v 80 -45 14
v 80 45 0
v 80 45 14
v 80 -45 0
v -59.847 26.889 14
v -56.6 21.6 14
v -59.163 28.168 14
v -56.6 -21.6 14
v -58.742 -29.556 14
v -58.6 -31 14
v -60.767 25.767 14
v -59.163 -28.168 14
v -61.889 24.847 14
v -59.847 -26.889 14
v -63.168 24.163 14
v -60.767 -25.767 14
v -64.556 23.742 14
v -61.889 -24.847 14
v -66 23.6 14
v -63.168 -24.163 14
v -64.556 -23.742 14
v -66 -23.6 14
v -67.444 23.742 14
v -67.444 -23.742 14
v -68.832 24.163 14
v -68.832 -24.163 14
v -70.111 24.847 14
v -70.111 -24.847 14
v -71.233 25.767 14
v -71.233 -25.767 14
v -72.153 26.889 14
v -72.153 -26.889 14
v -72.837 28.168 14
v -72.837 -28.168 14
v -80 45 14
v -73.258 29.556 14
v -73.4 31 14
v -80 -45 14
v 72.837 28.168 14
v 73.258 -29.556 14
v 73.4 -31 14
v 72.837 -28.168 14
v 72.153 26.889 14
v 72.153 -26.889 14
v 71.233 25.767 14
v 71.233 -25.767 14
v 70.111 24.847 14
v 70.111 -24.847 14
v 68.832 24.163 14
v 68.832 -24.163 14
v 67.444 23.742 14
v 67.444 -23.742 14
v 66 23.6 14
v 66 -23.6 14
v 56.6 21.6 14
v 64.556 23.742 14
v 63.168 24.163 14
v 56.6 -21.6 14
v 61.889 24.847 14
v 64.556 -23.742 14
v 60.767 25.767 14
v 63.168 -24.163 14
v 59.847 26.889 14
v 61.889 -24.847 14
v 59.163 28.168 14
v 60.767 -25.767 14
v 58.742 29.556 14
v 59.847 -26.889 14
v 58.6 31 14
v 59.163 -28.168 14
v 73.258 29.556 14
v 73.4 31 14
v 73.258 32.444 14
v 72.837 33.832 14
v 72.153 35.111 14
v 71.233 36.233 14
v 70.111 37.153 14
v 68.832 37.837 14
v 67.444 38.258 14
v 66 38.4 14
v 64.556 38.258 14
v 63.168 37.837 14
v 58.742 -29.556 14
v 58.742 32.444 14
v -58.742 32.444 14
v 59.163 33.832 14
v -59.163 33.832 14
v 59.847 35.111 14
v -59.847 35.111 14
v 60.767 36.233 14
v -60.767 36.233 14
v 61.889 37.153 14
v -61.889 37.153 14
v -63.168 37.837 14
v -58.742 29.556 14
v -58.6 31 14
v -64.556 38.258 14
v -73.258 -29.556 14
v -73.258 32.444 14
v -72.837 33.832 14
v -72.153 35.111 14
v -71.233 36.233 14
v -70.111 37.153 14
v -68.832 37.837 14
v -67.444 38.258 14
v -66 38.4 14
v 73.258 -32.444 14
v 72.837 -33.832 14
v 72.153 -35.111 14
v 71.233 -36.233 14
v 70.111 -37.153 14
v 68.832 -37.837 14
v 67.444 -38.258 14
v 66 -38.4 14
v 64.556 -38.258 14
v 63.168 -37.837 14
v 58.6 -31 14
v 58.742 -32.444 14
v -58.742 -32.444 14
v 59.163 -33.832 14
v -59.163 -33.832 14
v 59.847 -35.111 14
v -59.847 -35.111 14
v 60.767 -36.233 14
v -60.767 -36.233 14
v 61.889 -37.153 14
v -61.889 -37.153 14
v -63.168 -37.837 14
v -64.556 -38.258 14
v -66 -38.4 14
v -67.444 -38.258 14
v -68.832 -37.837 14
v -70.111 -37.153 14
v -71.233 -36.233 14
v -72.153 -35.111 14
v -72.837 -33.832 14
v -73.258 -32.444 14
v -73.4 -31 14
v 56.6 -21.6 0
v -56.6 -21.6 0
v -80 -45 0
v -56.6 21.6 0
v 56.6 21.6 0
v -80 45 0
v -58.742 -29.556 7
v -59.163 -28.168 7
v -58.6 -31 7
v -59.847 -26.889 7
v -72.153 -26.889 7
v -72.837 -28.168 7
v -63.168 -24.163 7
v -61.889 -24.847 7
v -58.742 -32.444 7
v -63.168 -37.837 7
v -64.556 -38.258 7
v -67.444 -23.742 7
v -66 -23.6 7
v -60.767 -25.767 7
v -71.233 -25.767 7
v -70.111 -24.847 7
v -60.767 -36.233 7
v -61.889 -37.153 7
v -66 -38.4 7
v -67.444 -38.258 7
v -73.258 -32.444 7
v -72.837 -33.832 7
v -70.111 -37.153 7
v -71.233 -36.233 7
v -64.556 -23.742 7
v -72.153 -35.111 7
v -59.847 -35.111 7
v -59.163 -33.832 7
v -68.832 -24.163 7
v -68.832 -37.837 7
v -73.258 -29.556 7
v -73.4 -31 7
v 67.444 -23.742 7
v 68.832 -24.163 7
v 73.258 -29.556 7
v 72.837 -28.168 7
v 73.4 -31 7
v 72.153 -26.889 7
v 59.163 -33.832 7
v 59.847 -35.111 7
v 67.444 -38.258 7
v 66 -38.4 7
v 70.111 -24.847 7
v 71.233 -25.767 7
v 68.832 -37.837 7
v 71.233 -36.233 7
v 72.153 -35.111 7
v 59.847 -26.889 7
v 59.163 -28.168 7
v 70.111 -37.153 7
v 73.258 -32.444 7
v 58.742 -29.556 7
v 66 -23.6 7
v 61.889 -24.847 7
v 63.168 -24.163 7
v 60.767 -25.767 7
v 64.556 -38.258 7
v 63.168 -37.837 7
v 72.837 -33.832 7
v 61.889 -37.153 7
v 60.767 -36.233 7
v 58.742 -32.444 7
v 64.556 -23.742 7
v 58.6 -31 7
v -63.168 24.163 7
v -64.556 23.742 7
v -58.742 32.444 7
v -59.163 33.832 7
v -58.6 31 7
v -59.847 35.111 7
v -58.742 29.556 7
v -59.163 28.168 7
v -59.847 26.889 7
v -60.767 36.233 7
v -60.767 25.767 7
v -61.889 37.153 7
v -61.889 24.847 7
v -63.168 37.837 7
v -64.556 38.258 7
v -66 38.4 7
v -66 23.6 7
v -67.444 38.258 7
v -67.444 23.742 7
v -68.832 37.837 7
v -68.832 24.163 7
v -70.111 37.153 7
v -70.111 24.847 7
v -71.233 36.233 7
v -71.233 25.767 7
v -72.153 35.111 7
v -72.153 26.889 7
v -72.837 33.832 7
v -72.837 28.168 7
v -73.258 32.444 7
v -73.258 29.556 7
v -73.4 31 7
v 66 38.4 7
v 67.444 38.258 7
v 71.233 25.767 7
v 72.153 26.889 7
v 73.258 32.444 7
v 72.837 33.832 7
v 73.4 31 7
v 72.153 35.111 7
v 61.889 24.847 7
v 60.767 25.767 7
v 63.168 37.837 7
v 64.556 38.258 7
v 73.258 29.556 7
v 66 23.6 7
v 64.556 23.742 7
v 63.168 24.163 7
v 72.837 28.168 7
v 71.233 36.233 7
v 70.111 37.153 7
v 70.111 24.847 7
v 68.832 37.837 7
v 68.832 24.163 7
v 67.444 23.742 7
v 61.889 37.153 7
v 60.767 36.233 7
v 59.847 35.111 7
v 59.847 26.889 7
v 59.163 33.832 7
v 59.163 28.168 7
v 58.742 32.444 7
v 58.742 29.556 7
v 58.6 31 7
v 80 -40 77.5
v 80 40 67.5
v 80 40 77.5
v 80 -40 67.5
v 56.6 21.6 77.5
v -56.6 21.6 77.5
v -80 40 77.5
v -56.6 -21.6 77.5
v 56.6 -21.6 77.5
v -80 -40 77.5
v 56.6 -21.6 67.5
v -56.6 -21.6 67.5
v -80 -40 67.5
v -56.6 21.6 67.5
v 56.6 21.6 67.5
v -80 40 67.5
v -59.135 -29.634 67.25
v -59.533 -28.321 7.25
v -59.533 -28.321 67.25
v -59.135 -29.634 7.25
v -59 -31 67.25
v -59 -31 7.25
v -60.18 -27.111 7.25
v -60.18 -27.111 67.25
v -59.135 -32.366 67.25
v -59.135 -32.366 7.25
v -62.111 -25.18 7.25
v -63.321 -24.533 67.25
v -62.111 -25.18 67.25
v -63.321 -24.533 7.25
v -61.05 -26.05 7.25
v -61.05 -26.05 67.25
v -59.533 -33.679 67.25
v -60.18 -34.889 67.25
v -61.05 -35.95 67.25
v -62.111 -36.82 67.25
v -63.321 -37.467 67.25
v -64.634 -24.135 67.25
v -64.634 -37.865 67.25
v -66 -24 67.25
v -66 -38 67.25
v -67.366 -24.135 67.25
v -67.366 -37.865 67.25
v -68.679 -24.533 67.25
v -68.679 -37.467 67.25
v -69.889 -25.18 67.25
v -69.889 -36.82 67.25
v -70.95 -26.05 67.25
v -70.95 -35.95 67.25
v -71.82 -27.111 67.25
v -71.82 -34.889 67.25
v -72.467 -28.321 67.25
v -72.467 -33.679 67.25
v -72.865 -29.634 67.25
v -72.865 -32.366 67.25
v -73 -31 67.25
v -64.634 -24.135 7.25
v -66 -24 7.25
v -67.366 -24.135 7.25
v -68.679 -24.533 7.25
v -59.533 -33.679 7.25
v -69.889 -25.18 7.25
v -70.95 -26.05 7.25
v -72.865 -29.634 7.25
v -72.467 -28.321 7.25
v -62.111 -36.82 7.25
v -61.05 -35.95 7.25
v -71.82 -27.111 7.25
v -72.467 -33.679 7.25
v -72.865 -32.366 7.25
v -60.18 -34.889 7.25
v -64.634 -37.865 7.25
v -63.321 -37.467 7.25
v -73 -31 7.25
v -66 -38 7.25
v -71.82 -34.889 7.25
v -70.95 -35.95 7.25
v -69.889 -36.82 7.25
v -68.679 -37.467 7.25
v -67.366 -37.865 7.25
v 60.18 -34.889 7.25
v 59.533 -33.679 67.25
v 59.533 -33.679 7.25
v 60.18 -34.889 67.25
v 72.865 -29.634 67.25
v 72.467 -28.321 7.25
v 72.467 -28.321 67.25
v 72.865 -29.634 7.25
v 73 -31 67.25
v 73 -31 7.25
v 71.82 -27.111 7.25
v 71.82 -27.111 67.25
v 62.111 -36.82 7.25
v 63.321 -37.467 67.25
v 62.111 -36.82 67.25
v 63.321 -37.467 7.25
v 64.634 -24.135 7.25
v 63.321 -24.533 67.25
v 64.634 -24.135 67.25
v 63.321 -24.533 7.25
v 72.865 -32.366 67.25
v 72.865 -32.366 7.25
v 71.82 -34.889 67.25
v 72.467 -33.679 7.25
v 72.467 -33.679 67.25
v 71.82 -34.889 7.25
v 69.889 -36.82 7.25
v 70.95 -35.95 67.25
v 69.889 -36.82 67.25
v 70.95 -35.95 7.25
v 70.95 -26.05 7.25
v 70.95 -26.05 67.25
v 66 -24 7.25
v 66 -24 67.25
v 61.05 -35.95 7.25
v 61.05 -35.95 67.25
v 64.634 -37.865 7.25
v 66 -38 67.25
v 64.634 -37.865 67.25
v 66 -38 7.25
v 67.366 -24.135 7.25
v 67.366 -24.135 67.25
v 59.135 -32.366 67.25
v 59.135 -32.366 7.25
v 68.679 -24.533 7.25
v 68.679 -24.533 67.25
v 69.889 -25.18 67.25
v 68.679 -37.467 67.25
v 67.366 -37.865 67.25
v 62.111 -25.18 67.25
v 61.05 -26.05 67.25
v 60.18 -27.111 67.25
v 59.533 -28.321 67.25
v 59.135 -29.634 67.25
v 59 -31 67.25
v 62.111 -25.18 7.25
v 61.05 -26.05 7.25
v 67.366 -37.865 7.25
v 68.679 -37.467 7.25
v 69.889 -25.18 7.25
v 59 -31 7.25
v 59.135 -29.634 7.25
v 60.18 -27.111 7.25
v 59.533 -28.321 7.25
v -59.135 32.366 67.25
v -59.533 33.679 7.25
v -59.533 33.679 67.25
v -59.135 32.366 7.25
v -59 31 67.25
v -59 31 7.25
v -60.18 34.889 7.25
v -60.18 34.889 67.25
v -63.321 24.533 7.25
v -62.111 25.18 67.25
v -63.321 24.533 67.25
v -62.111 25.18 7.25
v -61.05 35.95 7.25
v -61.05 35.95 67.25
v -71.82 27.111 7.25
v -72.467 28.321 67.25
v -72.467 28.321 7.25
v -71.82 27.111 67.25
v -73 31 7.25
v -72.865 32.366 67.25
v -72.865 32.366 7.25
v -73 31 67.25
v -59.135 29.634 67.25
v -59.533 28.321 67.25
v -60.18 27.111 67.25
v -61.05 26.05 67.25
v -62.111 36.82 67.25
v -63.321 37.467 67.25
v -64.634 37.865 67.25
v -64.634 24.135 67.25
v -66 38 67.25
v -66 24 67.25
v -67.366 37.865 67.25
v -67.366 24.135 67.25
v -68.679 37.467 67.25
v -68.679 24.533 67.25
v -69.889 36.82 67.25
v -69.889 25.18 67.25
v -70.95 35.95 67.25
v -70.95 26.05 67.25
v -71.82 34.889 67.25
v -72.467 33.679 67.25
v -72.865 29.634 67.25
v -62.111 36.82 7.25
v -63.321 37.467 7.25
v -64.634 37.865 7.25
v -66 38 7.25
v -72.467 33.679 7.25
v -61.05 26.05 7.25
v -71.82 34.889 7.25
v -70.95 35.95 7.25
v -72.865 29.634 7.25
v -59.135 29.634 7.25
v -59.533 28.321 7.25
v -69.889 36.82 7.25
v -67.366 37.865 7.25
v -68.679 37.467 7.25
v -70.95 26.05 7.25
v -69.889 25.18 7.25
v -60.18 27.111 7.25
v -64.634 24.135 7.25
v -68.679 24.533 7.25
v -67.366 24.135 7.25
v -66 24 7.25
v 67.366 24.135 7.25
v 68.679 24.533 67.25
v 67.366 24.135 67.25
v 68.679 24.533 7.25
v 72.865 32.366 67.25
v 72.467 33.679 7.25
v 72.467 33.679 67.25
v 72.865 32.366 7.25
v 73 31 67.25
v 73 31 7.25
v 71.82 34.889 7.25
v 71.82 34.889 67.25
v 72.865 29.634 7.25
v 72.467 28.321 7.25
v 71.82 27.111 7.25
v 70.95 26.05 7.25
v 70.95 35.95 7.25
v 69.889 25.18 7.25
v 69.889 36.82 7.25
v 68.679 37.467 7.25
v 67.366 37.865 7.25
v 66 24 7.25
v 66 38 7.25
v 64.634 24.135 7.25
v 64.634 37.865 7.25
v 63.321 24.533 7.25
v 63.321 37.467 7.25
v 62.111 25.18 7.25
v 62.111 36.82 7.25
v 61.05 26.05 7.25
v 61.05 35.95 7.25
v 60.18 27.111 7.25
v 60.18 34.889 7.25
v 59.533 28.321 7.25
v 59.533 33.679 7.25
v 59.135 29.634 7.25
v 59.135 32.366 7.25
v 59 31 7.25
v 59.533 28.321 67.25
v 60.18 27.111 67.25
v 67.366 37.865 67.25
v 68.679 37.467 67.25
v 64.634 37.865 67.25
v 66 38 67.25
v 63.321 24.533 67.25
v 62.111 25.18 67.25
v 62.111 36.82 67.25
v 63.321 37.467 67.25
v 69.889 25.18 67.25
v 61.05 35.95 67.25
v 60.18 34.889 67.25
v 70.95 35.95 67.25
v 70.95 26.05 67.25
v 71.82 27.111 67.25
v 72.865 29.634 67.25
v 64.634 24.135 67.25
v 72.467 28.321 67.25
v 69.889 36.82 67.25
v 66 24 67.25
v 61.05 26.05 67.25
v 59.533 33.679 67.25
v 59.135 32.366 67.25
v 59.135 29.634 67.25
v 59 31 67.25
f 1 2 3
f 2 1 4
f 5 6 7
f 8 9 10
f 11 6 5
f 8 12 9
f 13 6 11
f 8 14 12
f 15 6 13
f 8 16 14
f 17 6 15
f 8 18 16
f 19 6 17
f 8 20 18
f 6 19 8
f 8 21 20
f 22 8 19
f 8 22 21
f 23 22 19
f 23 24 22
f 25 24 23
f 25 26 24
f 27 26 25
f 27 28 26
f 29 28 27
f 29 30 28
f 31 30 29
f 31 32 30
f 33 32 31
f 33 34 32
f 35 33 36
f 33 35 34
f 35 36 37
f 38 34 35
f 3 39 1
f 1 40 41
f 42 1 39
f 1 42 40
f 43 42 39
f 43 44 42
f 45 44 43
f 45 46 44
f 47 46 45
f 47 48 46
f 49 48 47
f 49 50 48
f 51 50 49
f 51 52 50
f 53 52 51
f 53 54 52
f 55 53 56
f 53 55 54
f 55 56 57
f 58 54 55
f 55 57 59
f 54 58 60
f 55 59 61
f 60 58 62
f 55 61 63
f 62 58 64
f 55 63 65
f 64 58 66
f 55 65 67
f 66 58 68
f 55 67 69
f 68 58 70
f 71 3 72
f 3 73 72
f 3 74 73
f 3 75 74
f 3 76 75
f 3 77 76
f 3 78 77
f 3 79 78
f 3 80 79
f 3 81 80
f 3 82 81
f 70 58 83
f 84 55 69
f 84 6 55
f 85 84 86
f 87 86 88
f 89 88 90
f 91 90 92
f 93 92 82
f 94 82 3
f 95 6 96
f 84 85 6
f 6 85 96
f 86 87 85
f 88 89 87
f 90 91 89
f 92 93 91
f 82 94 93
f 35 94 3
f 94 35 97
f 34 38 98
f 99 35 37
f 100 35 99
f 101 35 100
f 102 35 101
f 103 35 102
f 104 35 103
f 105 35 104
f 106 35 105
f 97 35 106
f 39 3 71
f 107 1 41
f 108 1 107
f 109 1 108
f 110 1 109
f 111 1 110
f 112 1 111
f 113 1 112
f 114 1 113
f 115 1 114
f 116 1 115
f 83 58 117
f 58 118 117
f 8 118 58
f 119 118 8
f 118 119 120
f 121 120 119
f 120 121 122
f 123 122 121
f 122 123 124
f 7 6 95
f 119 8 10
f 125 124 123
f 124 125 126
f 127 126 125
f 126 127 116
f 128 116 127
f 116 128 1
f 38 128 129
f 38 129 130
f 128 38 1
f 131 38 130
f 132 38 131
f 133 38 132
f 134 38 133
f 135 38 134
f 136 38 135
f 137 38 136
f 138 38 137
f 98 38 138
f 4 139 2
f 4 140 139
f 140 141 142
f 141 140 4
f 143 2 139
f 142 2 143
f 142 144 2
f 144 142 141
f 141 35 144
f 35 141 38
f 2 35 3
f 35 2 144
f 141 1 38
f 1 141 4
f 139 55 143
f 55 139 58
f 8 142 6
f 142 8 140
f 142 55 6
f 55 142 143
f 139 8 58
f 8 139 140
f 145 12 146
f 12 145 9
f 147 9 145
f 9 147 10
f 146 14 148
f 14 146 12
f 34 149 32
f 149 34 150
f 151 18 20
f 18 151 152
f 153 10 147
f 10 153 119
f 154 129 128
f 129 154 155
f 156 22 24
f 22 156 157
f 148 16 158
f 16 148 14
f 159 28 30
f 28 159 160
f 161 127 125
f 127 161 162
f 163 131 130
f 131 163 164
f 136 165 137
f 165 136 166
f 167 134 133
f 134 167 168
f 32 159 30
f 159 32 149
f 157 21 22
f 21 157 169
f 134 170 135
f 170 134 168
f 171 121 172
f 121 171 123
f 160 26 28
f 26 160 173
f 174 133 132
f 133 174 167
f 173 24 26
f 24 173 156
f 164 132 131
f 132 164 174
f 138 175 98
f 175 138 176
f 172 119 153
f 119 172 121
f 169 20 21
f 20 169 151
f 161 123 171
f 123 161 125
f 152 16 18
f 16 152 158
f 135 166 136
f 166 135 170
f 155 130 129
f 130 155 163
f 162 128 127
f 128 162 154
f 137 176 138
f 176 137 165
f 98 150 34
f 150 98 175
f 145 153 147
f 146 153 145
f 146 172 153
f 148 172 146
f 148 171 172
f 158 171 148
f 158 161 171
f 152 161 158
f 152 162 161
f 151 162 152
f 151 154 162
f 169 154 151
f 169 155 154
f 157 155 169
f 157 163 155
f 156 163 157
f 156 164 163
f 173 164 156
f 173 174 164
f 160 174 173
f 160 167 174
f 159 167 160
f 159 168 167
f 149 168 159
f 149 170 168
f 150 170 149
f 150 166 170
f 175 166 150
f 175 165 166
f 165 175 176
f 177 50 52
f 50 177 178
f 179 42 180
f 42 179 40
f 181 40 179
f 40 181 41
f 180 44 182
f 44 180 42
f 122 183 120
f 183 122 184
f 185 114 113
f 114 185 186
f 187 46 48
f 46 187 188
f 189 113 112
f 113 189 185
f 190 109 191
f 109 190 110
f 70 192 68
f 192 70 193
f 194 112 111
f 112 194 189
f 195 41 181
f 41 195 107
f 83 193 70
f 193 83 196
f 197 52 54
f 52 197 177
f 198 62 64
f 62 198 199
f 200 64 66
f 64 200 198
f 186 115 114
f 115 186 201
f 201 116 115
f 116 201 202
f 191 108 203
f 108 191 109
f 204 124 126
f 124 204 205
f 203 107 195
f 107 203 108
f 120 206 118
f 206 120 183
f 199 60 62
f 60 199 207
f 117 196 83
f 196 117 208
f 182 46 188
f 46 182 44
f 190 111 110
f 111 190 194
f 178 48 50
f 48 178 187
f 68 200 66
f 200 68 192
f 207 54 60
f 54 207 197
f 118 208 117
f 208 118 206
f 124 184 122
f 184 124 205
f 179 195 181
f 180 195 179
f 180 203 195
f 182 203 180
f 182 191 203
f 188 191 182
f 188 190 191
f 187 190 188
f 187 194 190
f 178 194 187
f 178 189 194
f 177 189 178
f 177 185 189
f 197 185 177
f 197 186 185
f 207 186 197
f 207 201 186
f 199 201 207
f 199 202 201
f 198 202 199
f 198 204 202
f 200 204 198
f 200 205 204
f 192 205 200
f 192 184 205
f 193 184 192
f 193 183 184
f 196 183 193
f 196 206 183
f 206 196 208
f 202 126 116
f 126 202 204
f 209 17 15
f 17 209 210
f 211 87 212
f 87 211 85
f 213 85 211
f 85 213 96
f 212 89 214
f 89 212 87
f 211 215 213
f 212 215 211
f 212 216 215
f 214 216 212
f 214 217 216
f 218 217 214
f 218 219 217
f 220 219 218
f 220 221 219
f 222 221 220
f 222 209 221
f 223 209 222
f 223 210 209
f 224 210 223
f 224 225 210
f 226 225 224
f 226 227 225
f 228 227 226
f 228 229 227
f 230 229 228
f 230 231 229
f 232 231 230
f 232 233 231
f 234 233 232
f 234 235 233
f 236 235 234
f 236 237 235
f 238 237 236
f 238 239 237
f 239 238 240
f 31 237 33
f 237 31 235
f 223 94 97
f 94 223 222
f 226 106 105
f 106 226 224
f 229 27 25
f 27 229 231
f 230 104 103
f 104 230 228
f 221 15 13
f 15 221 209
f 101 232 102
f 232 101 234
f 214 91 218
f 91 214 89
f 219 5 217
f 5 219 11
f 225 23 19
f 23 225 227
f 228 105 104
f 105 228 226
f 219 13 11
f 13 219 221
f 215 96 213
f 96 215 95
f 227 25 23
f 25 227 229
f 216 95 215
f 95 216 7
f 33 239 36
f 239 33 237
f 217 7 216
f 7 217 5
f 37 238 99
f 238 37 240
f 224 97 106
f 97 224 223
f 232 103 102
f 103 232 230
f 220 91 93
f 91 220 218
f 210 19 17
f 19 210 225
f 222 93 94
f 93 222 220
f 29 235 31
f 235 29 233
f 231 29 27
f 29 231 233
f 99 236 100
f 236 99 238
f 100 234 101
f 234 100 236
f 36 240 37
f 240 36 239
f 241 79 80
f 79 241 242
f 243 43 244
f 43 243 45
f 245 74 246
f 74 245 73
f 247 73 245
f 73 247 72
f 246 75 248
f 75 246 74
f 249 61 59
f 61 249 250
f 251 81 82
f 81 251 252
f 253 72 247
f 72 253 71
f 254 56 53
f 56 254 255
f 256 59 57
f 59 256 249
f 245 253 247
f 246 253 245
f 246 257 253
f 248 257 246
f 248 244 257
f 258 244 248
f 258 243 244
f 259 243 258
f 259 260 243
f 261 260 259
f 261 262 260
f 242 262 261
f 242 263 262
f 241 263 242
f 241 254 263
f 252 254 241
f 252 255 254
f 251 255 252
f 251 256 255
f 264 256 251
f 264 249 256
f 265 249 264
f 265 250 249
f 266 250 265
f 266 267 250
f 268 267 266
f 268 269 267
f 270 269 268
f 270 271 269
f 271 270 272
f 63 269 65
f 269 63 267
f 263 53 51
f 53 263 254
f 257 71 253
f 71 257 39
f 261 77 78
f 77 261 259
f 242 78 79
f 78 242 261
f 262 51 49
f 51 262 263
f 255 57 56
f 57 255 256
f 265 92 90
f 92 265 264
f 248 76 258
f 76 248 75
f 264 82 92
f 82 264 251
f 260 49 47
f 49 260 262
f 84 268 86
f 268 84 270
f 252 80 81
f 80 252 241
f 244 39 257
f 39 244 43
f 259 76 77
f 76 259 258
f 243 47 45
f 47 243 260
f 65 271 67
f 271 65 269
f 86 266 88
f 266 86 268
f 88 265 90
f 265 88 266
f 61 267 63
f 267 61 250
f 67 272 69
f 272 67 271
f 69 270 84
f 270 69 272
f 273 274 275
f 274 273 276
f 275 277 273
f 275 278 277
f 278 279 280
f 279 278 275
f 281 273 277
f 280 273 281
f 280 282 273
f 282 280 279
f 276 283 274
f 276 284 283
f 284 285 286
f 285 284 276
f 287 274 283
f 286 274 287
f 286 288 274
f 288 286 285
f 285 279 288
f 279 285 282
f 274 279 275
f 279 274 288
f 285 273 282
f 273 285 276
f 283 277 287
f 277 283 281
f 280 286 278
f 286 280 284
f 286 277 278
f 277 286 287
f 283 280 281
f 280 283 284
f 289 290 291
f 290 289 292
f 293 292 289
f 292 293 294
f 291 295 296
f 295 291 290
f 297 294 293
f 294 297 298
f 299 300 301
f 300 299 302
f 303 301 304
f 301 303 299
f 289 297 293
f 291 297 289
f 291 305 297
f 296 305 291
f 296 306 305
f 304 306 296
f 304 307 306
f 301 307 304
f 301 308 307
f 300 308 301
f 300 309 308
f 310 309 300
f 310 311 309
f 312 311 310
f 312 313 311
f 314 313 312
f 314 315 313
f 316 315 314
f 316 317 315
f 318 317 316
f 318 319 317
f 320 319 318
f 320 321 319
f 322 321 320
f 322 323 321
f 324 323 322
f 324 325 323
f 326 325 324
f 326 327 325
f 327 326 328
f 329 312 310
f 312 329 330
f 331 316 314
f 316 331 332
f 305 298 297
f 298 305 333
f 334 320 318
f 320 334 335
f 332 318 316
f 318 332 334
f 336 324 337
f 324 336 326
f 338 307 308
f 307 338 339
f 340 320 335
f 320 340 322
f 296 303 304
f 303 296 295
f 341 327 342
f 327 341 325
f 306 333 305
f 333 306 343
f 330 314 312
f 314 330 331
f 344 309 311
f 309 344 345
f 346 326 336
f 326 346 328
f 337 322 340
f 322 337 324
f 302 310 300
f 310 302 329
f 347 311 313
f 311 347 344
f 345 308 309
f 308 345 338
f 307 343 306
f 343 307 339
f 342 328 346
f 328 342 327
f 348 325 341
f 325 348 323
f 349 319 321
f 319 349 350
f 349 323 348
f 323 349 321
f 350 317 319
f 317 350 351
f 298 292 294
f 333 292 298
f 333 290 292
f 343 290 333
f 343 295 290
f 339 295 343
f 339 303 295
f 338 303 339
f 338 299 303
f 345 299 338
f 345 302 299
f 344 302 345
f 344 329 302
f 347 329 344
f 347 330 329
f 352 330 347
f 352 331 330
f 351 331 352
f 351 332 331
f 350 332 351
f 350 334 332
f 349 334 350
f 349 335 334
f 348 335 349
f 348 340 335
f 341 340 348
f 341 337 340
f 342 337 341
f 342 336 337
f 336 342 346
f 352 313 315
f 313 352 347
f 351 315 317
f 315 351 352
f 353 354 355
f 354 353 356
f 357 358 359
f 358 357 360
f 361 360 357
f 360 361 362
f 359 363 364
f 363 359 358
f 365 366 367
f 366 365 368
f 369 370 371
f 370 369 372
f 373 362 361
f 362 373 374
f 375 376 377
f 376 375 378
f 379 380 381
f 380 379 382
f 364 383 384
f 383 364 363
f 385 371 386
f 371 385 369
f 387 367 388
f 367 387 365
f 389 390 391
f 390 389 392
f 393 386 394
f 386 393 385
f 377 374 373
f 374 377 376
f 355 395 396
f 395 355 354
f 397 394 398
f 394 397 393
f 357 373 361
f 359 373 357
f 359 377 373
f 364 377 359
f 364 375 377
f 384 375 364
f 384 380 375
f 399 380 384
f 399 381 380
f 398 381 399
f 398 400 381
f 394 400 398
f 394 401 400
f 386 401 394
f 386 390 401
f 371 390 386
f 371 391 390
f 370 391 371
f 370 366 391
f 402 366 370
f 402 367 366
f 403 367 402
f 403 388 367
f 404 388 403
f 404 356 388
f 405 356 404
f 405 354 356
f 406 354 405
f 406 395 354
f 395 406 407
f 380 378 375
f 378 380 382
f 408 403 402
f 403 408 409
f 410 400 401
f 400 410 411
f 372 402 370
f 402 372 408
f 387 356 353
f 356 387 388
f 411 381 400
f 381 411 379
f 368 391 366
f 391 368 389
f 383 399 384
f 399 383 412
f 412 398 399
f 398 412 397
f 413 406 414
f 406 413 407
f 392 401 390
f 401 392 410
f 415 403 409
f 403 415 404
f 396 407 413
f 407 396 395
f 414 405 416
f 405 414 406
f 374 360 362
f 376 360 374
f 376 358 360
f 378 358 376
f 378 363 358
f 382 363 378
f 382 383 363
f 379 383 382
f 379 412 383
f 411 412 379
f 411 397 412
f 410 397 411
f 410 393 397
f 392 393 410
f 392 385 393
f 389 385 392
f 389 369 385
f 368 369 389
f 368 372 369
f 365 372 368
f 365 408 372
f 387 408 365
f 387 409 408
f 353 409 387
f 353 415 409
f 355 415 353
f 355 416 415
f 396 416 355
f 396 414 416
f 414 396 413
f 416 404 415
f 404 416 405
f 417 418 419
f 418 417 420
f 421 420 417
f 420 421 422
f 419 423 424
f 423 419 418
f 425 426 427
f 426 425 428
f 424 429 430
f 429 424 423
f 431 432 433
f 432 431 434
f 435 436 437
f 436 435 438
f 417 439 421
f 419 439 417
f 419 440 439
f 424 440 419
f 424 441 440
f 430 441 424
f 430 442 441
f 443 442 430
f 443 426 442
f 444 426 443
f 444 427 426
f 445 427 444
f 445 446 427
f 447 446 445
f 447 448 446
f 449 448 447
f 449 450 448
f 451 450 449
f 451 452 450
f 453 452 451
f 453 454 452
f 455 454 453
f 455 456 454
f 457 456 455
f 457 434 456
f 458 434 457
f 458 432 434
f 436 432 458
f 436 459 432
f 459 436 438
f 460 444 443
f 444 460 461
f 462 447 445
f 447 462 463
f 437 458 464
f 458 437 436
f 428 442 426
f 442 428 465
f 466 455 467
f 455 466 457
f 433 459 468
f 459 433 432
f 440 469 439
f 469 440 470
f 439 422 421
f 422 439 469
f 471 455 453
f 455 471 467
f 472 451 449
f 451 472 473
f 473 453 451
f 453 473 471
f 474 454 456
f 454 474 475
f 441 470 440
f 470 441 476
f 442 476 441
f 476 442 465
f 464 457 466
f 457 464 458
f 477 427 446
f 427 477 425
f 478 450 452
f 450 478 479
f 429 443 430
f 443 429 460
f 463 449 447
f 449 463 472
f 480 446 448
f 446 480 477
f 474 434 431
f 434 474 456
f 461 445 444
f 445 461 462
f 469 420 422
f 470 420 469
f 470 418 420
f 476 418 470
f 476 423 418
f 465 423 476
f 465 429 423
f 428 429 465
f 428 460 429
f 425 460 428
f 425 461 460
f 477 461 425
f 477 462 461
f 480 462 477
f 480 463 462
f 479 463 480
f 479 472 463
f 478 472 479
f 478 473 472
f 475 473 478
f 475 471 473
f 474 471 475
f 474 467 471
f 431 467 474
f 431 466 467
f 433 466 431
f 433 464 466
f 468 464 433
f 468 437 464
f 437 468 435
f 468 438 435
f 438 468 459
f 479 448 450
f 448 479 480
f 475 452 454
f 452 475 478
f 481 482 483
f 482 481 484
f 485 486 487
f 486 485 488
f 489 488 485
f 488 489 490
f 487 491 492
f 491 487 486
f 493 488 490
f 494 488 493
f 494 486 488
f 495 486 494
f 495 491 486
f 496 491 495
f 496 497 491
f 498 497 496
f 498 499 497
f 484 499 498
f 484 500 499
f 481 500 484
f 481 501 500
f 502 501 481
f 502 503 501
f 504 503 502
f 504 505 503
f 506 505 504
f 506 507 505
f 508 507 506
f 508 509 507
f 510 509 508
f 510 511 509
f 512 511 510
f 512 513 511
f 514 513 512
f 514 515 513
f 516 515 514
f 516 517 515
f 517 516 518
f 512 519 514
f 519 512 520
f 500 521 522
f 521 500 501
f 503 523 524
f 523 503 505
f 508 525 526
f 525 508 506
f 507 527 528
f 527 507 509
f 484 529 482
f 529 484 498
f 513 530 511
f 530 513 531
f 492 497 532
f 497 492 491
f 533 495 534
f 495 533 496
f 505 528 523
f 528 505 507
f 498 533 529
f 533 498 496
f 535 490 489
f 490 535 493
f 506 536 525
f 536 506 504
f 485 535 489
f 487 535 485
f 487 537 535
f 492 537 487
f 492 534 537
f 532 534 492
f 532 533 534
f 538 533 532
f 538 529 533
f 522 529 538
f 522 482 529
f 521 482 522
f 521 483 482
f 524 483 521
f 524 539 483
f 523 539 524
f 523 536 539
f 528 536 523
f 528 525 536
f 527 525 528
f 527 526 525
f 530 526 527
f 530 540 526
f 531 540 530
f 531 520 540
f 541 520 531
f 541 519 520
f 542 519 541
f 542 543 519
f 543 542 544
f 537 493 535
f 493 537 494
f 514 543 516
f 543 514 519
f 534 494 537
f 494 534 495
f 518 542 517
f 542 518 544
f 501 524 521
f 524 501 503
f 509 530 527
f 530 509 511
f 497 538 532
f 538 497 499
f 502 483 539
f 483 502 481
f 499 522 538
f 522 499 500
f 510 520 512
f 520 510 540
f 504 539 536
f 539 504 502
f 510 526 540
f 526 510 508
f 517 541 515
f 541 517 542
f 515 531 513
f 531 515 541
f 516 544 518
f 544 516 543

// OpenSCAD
$fn = 32;

// ------------------------------------------------------------------------
// Frame cube: base 160 x 90 mm, posts 60 mm tall
// Every part is its own module, assembly() places every instance.
// ------------------------------------------------------------------------

// --- part 1 ---
module base_frame() {
  difference() {
    translate([-80, -45, 0]) cube([160, 90, 14]);
    translate([-56.6, -21.6, -1]) cube([113.2, 43.2, 16]);
    translate([-66, -31, 7]) cylinder(h = 8, d = 14.8);
    translate([66, -31, 7]) cylinder(h = 8, d = 14.8);
    translate([-66, 31, 7]) cylinder(h = 8, d = 14.8);
    translate([66, 31, 7]) cylinder(h = 8, d = 14.8);
  }
}

// --- part 2 ---
module corner_post() {
  cylinder(h = 60, d = 14);
}

// --- part 3 ---
module top_frame() {
  difference() {
    translate([-80, -40, 0]) cube([160, 80, 10]);
    translate([-56.6, -21.6, -1]) cube([113.2, 43.2, 12]);
  }
}

// --- assembly ---
module assembly() {
  color([0.80, 0.24, 0.20]) translate([0, 0, 0]) rotate([0, 0, 0]) base_frame();
  color([0.20, 0.45, 0.75]) translate([-66, -31, 7.25]) rotate([0, 0, 0]) corner_post();
  color([0.25, 0.62, 0.32]) translate([66, -31, 7.25]) rotate([0, 0, 0]) corner_post();
  color([0.92, 0.70, 0.18]) translate([-66, 31, 7.25]) rotate([0, 0, 0]) corner_post();
  color([0.58, 0.35, 0.70]) translate([66, 31, 7.25]) rotate([0, 0, 0]) corner_post();
  color([0.16, 0.66, 0.66]) translate([0, 0, 67.5]) rotate([0, 0, 0]) top_frame();
}

assembly();
